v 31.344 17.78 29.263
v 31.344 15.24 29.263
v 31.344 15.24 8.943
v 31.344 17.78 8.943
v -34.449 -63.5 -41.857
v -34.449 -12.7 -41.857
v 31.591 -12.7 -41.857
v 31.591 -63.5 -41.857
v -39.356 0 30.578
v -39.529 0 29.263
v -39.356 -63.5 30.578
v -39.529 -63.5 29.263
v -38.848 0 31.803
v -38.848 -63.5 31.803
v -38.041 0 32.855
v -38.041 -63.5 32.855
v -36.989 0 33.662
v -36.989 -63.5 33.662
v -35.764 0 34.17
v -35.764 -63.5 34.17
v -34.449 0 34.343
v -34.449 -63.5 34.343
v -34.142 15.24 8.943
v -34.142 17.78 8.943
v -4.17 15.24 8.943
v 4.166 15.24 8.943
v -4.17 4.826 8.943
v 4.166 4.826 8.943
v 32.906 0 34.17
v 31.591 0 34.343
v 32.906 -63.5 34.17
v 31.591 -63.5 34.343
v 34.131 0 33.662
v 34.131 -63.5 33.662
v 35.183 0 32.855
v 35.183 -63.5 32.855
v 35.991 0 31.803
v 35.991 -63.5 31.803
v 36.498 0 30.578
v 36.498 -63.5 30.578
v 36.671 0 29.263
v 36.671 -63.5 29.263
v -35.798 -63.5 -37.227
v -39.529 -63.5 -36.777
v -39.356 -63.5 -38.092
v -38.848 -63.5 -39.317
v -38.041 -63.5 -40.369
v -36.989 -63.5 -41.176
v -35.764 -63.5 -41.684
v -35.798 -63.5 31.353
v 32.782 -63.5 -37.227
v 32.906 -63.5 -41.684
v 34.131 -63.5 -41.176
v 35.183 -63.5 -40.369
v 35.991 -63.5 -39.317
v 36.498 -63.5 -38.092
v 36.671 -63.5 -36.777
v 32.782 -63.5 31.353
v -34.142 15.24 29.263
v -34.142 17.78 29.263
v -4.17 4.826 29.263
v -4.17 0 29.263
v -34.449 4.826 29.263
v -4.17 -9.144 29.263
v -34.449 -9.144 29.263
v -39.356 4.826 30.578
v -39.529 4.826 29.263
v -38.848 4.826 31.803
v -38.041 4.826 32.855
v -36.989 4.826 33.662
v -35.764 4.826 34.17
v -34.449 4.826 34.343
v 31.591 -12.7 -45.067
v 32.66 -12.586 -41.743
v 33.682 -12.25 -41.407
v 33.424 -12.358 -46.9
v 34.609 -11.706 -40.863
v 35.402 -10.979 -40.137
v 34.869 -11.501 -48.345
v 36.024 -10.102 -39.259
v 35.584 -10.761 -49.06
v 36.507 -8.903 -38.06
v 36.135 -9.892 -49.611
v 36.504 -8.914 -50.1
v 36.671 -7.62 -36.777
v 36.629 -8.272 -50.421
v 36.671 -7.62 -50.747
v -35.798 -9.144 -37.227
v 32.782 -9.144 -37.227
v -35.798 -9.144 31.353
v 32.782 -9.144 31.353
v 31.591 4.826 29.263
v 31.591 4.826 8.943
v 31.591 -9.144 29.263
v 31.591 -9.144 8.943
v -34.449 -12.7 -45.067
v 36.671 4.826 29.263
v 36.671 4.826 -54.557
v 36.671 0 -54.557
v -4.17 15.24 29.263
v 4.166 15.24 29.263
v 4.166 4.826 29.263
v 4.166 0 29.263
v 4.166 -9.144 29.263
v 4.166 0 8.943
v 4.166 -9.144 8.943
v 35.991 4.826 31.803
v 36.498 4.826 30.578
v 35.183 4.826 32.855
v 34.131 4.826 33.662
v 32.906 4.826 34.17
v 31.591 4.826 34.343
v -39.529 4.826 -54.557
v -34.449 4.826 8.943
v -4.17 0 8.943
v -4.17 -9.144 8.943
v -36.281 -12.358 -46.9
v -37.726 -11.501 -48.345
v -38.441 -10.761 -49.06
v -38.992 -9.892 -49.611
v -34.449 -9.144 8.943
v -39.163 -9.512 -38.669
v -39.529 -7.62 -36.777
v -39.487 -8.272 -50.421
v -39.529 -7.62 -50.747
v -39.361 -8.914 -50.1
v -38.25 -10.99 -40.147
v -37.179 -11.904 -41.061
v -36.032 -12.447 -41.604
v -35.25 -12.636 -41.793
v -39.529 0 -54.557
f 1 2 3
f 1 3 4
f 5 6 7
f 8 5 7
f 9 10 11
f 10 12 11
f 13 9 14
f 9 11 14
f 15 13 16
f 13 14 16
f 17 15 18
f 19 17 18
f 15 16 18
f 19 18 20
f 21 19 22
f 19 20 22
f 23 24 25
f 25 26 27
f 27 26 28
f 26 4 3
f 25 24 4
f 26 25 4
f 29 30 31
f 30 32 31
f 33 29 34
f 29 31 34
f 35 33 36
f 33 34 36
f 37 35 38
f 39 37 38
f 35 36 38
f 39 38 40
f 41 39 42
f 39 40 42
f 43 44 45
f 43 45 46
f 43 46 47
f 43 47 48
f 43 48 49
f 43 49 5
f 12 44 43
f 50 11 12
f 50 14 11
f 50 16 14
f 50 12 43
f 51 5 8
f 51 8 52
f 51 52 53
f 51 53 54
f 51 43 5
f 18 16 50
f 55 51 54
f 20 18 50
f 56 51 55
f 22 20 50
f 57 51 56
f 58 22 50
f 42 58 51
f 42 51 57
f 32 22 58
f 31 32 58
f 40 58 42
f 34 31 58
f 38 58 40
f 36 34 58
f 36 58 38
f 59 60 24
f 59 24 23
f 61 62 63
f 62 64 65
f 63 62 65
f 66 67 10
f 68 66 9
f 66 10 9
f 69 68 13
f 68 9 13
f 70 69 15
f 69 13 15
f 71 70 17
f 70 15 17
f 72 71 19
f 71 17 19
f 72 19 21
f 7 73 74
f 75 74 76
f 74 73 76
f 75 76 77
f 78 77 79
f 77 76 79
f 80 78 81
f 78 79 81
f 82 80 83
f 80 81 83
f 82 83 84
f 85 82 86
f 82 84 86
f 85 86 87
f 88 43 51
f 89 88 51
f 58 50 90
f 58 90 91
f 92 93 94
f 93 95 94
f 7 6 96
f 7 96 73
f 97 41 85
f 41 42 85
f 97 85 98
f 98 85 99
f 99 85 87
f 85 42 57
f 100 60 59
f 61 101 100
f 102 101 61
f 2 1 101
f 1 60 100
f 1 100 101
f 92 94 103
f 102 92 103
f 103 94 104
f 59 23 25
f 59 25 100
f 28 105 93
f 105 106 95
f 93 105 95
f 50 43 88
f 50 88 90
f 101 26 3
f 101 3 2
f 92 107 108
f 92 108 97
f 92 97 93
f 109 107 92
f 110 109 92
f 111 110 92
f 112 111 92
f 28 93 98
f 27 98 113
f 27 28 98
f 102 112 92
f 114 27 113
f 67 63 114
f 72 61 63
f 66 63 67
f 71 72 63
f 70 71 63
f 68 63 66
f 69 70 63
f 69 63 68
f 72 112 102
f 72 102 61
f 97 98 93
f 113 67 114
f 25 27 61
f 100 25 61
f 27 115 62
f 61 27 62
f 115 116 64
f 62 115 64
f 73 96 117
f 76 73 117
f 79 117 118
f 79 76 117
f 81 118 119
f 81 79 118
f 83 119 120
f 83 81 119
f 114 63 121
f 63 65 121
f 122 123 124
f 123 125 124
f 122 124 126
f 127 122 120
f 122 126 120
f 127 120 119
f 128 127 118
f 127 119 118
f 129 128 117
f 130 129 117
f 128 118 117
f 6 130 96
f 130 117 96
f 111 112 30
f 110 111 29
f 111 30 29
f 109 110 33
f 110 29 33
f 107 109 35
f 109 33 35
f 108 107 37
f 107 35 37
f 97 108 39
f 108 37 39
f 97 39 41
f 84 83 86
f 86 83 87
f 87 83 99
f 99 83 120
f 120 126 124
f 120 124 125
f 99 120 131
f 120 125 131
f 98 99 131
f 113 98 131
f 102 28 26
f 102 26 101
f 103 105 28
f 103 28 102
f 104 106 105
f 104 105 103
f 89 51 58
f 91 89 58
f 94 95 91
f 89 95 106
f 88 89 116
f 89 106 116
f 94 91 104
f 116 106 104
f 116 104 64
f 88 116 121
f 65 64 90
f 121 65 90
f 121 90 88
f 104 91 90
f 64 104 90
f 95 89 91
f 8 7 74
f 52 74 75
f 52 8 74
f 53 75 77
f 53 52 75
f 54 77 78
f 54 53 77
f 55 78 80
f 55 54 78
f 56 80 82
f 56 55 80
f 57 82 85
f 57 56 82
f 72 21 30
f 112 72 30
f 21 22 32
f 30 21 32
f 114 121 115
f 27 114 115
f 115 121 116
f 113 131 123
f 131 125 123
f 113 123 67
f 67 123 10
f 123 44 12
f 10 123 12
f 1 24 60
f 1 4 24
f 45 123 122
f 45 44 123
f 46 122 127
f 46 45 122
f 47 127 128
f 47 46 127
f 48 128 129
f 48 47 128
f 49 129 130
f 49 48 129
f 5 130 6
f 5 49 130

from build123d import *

# Parameters (mm, degrees)
F0_W      = 76.2
F0_H      = 76.2
F1_DEPTH  = 63.5
F2_W      = 68.58
F2_H      = 68.58
F3_DEPTH  = 54.356
F4_W      = 76.2
F4_H      = 12.7
F5_DEPTH  = 12.7
F7_DEPTH  = 81.788
F8_R      = 5.08
F9_W      = 66.04
F9_H      = 20.32
F10_DEPTH = 25.4
F12_DEPTH = 25.4
F13_W     = 8.3356503789
F13_H     = 20.32
F14_DEPTH = 17.78
F15_W     = 2.54
F15_H     = 20.32
F16_DEPTH = 27.178
F17_W     = 2.54
F17_H     = 20.32
F18_DEPTH = 29.972
F20_DEPTH = 4.826


with BuildPart() as f1:
    # F0 (on Front) → F1 (new body)
    with BuildSketch(Plane.XZ):
        with Locations((-1.4287489414, -3.7570823967)):
            Rectangle(F0_W, F0_H)
    extrude(amount=F1_DEPTH)

    # F2 (on face) → F3 (cut)
    with BuildSketch(Plane.XZ.offset(63.5)):
        with Locations((-1.5081233764, -2.9368781066)):
            Rectangle(F2_W, F2_H)
    extrude(amount=-F3_DEPTH, mode=Mode.SUBTRACT)

    # F4 (on face) → F5 (join)
    with BuildSketch(Plane(origin=(0, 0, -41.8570823967), x_dir=(1, 0, 0), z_dir=(0, 0, -1))):
        with Locations((-1.4287489414, 6.35)):
            Rectangle(F4_W, F4_H)
    extrude(amount=F5_DEPTH)

    # F6 (on face) → F7 (cut)
    with BuildSketch(Plane(origin=(-39.5287489414, 0, 0), x_dir=(0, -1, 0), z_dir=(-1, 0, 0))):
        Polygon((12.7, -48.2070823967), (0, -54.5570823967), (12.7, -54.5570823967), align=None)
    extrude(amount=-F7_DEPTH, mode=Mode.SUBTRACT)

    # F8
    f8_edges = [f1.edges().sort_by_distance(p)[0] for p in [
        (-39.528749, -38.1, -41.857082),
        (36.671251, -38.1, -41.857082),
        (-1.428749, -12.7, -48.207082),
        (-39.528749, -12.7, -45.032082),
        (36.671251, -12.7, -45.032082),
        (36.671251, -31.75, 34.342918),
        (-39.528749, -31.75, 34.342918),
    ]]
    fillet(f8_edges, radius=F8_R)

    # F9 (on face) → F10 (cut)
    with BuildSketch(Plane(origin=(0, 0, 0), x_dir=(-1, 0, 0), z_dir=(0, 1, 0))):
        with Locations((1.4287489414, 19.1029176033)):
            Rectangle(F9_W, F9_H)
    extrude(amount=-F10_DEPTH, mode=Mode.SUBTRACT)

    # F11 (on face) → F12 (join)
    with BuildSketch(Plane(origin=(0, 0, 29.2629176033), x_dir=(1, 0, 0), z_dir=(0, 0, -1))):
        Polygon((4.1656, 9.144), (-4.1700503789, 9.144), (-4.1700503789, 0), (0, 0), (4.1656, 0), align=None)
    extrude(amount=F12_DEPTH)

    # F13 (on face) → F14 (join)
    with BuildSketch(Plane(origin=(0, 0, 0), x_dir=(-1, 0, 0), z_dir=(0, 1, 0))):
        with Locations((0.0022251894, 19.1029176033)):
            Rectangle(F13_W, F13_H)
    extrude(amount=F14_DEPTH)

    # F15 (on face) → F16 (join)
    with BuildSketch(Plane.YZ.offset(4.1656)):
        with Locations((16.51, 19.1029176033)):
            Rectangle(F15_W, F15_H)
    extrude(amount=F16_DEPTH)

    # F17 (on face) → F18 (join)
    with BuildSketch(Plane(origin=(-4.1700503789, 0, 0), x_dir=(0, -1, 0), z_dir=(-1, 0, 0))):
        with Locations((-16.51, 19.1029176033)):
            Rectangle(F17_W, F17_H)
    extrude(amount=F18_DEPTH)

    # F19 (on face) → F20 (join)
    with BuildSketch(Plane(origin=(0, 0, 0), x_dir=(-1, 0, 0), z_dir=(0, 1, 0))):
        with BuildLine():
            ThreePointArc((39.5287489414, 29.2629176033), (38.0408513898, 32.8550200517), (34.4487489414, 34.3429176033))
            Line((34.4487489414, 34.3429176033), (-31.5912510586, 34.3429176033))
            ThreePointArc((-31.5912510586, 34.3429176033), (-35.183353507, 32.8550200517), (-36.6712510586, 29.2629176033))
            Line((-36.6712510586, 29.2629176033), (-36.6712510586, -54.5570823967))
            Line((-36.6712510586, -54.5570823967), (39.5287489414, -54.5570823967))
            Line((39.5287489414, -54.5570823967), (39.5287489414, 29.2629176033))
        make_face()
        Polygon((34.4487489414, 29.2629176033), (34.4487489414, 8.9429176033), (4.1700503789, 8.9429176033), (-4.1656, 8.9429176033), (-31.5912510586, 8.9429176033), (-31.5912510586, 29.2629176033), (-4.1656, 29.2629176033), (4.1700503789, 29.2629176033), align=None, mode=Mode.SUBTRACT)
    extrude(amount=F20_DEPTH)


solid = f1.part
